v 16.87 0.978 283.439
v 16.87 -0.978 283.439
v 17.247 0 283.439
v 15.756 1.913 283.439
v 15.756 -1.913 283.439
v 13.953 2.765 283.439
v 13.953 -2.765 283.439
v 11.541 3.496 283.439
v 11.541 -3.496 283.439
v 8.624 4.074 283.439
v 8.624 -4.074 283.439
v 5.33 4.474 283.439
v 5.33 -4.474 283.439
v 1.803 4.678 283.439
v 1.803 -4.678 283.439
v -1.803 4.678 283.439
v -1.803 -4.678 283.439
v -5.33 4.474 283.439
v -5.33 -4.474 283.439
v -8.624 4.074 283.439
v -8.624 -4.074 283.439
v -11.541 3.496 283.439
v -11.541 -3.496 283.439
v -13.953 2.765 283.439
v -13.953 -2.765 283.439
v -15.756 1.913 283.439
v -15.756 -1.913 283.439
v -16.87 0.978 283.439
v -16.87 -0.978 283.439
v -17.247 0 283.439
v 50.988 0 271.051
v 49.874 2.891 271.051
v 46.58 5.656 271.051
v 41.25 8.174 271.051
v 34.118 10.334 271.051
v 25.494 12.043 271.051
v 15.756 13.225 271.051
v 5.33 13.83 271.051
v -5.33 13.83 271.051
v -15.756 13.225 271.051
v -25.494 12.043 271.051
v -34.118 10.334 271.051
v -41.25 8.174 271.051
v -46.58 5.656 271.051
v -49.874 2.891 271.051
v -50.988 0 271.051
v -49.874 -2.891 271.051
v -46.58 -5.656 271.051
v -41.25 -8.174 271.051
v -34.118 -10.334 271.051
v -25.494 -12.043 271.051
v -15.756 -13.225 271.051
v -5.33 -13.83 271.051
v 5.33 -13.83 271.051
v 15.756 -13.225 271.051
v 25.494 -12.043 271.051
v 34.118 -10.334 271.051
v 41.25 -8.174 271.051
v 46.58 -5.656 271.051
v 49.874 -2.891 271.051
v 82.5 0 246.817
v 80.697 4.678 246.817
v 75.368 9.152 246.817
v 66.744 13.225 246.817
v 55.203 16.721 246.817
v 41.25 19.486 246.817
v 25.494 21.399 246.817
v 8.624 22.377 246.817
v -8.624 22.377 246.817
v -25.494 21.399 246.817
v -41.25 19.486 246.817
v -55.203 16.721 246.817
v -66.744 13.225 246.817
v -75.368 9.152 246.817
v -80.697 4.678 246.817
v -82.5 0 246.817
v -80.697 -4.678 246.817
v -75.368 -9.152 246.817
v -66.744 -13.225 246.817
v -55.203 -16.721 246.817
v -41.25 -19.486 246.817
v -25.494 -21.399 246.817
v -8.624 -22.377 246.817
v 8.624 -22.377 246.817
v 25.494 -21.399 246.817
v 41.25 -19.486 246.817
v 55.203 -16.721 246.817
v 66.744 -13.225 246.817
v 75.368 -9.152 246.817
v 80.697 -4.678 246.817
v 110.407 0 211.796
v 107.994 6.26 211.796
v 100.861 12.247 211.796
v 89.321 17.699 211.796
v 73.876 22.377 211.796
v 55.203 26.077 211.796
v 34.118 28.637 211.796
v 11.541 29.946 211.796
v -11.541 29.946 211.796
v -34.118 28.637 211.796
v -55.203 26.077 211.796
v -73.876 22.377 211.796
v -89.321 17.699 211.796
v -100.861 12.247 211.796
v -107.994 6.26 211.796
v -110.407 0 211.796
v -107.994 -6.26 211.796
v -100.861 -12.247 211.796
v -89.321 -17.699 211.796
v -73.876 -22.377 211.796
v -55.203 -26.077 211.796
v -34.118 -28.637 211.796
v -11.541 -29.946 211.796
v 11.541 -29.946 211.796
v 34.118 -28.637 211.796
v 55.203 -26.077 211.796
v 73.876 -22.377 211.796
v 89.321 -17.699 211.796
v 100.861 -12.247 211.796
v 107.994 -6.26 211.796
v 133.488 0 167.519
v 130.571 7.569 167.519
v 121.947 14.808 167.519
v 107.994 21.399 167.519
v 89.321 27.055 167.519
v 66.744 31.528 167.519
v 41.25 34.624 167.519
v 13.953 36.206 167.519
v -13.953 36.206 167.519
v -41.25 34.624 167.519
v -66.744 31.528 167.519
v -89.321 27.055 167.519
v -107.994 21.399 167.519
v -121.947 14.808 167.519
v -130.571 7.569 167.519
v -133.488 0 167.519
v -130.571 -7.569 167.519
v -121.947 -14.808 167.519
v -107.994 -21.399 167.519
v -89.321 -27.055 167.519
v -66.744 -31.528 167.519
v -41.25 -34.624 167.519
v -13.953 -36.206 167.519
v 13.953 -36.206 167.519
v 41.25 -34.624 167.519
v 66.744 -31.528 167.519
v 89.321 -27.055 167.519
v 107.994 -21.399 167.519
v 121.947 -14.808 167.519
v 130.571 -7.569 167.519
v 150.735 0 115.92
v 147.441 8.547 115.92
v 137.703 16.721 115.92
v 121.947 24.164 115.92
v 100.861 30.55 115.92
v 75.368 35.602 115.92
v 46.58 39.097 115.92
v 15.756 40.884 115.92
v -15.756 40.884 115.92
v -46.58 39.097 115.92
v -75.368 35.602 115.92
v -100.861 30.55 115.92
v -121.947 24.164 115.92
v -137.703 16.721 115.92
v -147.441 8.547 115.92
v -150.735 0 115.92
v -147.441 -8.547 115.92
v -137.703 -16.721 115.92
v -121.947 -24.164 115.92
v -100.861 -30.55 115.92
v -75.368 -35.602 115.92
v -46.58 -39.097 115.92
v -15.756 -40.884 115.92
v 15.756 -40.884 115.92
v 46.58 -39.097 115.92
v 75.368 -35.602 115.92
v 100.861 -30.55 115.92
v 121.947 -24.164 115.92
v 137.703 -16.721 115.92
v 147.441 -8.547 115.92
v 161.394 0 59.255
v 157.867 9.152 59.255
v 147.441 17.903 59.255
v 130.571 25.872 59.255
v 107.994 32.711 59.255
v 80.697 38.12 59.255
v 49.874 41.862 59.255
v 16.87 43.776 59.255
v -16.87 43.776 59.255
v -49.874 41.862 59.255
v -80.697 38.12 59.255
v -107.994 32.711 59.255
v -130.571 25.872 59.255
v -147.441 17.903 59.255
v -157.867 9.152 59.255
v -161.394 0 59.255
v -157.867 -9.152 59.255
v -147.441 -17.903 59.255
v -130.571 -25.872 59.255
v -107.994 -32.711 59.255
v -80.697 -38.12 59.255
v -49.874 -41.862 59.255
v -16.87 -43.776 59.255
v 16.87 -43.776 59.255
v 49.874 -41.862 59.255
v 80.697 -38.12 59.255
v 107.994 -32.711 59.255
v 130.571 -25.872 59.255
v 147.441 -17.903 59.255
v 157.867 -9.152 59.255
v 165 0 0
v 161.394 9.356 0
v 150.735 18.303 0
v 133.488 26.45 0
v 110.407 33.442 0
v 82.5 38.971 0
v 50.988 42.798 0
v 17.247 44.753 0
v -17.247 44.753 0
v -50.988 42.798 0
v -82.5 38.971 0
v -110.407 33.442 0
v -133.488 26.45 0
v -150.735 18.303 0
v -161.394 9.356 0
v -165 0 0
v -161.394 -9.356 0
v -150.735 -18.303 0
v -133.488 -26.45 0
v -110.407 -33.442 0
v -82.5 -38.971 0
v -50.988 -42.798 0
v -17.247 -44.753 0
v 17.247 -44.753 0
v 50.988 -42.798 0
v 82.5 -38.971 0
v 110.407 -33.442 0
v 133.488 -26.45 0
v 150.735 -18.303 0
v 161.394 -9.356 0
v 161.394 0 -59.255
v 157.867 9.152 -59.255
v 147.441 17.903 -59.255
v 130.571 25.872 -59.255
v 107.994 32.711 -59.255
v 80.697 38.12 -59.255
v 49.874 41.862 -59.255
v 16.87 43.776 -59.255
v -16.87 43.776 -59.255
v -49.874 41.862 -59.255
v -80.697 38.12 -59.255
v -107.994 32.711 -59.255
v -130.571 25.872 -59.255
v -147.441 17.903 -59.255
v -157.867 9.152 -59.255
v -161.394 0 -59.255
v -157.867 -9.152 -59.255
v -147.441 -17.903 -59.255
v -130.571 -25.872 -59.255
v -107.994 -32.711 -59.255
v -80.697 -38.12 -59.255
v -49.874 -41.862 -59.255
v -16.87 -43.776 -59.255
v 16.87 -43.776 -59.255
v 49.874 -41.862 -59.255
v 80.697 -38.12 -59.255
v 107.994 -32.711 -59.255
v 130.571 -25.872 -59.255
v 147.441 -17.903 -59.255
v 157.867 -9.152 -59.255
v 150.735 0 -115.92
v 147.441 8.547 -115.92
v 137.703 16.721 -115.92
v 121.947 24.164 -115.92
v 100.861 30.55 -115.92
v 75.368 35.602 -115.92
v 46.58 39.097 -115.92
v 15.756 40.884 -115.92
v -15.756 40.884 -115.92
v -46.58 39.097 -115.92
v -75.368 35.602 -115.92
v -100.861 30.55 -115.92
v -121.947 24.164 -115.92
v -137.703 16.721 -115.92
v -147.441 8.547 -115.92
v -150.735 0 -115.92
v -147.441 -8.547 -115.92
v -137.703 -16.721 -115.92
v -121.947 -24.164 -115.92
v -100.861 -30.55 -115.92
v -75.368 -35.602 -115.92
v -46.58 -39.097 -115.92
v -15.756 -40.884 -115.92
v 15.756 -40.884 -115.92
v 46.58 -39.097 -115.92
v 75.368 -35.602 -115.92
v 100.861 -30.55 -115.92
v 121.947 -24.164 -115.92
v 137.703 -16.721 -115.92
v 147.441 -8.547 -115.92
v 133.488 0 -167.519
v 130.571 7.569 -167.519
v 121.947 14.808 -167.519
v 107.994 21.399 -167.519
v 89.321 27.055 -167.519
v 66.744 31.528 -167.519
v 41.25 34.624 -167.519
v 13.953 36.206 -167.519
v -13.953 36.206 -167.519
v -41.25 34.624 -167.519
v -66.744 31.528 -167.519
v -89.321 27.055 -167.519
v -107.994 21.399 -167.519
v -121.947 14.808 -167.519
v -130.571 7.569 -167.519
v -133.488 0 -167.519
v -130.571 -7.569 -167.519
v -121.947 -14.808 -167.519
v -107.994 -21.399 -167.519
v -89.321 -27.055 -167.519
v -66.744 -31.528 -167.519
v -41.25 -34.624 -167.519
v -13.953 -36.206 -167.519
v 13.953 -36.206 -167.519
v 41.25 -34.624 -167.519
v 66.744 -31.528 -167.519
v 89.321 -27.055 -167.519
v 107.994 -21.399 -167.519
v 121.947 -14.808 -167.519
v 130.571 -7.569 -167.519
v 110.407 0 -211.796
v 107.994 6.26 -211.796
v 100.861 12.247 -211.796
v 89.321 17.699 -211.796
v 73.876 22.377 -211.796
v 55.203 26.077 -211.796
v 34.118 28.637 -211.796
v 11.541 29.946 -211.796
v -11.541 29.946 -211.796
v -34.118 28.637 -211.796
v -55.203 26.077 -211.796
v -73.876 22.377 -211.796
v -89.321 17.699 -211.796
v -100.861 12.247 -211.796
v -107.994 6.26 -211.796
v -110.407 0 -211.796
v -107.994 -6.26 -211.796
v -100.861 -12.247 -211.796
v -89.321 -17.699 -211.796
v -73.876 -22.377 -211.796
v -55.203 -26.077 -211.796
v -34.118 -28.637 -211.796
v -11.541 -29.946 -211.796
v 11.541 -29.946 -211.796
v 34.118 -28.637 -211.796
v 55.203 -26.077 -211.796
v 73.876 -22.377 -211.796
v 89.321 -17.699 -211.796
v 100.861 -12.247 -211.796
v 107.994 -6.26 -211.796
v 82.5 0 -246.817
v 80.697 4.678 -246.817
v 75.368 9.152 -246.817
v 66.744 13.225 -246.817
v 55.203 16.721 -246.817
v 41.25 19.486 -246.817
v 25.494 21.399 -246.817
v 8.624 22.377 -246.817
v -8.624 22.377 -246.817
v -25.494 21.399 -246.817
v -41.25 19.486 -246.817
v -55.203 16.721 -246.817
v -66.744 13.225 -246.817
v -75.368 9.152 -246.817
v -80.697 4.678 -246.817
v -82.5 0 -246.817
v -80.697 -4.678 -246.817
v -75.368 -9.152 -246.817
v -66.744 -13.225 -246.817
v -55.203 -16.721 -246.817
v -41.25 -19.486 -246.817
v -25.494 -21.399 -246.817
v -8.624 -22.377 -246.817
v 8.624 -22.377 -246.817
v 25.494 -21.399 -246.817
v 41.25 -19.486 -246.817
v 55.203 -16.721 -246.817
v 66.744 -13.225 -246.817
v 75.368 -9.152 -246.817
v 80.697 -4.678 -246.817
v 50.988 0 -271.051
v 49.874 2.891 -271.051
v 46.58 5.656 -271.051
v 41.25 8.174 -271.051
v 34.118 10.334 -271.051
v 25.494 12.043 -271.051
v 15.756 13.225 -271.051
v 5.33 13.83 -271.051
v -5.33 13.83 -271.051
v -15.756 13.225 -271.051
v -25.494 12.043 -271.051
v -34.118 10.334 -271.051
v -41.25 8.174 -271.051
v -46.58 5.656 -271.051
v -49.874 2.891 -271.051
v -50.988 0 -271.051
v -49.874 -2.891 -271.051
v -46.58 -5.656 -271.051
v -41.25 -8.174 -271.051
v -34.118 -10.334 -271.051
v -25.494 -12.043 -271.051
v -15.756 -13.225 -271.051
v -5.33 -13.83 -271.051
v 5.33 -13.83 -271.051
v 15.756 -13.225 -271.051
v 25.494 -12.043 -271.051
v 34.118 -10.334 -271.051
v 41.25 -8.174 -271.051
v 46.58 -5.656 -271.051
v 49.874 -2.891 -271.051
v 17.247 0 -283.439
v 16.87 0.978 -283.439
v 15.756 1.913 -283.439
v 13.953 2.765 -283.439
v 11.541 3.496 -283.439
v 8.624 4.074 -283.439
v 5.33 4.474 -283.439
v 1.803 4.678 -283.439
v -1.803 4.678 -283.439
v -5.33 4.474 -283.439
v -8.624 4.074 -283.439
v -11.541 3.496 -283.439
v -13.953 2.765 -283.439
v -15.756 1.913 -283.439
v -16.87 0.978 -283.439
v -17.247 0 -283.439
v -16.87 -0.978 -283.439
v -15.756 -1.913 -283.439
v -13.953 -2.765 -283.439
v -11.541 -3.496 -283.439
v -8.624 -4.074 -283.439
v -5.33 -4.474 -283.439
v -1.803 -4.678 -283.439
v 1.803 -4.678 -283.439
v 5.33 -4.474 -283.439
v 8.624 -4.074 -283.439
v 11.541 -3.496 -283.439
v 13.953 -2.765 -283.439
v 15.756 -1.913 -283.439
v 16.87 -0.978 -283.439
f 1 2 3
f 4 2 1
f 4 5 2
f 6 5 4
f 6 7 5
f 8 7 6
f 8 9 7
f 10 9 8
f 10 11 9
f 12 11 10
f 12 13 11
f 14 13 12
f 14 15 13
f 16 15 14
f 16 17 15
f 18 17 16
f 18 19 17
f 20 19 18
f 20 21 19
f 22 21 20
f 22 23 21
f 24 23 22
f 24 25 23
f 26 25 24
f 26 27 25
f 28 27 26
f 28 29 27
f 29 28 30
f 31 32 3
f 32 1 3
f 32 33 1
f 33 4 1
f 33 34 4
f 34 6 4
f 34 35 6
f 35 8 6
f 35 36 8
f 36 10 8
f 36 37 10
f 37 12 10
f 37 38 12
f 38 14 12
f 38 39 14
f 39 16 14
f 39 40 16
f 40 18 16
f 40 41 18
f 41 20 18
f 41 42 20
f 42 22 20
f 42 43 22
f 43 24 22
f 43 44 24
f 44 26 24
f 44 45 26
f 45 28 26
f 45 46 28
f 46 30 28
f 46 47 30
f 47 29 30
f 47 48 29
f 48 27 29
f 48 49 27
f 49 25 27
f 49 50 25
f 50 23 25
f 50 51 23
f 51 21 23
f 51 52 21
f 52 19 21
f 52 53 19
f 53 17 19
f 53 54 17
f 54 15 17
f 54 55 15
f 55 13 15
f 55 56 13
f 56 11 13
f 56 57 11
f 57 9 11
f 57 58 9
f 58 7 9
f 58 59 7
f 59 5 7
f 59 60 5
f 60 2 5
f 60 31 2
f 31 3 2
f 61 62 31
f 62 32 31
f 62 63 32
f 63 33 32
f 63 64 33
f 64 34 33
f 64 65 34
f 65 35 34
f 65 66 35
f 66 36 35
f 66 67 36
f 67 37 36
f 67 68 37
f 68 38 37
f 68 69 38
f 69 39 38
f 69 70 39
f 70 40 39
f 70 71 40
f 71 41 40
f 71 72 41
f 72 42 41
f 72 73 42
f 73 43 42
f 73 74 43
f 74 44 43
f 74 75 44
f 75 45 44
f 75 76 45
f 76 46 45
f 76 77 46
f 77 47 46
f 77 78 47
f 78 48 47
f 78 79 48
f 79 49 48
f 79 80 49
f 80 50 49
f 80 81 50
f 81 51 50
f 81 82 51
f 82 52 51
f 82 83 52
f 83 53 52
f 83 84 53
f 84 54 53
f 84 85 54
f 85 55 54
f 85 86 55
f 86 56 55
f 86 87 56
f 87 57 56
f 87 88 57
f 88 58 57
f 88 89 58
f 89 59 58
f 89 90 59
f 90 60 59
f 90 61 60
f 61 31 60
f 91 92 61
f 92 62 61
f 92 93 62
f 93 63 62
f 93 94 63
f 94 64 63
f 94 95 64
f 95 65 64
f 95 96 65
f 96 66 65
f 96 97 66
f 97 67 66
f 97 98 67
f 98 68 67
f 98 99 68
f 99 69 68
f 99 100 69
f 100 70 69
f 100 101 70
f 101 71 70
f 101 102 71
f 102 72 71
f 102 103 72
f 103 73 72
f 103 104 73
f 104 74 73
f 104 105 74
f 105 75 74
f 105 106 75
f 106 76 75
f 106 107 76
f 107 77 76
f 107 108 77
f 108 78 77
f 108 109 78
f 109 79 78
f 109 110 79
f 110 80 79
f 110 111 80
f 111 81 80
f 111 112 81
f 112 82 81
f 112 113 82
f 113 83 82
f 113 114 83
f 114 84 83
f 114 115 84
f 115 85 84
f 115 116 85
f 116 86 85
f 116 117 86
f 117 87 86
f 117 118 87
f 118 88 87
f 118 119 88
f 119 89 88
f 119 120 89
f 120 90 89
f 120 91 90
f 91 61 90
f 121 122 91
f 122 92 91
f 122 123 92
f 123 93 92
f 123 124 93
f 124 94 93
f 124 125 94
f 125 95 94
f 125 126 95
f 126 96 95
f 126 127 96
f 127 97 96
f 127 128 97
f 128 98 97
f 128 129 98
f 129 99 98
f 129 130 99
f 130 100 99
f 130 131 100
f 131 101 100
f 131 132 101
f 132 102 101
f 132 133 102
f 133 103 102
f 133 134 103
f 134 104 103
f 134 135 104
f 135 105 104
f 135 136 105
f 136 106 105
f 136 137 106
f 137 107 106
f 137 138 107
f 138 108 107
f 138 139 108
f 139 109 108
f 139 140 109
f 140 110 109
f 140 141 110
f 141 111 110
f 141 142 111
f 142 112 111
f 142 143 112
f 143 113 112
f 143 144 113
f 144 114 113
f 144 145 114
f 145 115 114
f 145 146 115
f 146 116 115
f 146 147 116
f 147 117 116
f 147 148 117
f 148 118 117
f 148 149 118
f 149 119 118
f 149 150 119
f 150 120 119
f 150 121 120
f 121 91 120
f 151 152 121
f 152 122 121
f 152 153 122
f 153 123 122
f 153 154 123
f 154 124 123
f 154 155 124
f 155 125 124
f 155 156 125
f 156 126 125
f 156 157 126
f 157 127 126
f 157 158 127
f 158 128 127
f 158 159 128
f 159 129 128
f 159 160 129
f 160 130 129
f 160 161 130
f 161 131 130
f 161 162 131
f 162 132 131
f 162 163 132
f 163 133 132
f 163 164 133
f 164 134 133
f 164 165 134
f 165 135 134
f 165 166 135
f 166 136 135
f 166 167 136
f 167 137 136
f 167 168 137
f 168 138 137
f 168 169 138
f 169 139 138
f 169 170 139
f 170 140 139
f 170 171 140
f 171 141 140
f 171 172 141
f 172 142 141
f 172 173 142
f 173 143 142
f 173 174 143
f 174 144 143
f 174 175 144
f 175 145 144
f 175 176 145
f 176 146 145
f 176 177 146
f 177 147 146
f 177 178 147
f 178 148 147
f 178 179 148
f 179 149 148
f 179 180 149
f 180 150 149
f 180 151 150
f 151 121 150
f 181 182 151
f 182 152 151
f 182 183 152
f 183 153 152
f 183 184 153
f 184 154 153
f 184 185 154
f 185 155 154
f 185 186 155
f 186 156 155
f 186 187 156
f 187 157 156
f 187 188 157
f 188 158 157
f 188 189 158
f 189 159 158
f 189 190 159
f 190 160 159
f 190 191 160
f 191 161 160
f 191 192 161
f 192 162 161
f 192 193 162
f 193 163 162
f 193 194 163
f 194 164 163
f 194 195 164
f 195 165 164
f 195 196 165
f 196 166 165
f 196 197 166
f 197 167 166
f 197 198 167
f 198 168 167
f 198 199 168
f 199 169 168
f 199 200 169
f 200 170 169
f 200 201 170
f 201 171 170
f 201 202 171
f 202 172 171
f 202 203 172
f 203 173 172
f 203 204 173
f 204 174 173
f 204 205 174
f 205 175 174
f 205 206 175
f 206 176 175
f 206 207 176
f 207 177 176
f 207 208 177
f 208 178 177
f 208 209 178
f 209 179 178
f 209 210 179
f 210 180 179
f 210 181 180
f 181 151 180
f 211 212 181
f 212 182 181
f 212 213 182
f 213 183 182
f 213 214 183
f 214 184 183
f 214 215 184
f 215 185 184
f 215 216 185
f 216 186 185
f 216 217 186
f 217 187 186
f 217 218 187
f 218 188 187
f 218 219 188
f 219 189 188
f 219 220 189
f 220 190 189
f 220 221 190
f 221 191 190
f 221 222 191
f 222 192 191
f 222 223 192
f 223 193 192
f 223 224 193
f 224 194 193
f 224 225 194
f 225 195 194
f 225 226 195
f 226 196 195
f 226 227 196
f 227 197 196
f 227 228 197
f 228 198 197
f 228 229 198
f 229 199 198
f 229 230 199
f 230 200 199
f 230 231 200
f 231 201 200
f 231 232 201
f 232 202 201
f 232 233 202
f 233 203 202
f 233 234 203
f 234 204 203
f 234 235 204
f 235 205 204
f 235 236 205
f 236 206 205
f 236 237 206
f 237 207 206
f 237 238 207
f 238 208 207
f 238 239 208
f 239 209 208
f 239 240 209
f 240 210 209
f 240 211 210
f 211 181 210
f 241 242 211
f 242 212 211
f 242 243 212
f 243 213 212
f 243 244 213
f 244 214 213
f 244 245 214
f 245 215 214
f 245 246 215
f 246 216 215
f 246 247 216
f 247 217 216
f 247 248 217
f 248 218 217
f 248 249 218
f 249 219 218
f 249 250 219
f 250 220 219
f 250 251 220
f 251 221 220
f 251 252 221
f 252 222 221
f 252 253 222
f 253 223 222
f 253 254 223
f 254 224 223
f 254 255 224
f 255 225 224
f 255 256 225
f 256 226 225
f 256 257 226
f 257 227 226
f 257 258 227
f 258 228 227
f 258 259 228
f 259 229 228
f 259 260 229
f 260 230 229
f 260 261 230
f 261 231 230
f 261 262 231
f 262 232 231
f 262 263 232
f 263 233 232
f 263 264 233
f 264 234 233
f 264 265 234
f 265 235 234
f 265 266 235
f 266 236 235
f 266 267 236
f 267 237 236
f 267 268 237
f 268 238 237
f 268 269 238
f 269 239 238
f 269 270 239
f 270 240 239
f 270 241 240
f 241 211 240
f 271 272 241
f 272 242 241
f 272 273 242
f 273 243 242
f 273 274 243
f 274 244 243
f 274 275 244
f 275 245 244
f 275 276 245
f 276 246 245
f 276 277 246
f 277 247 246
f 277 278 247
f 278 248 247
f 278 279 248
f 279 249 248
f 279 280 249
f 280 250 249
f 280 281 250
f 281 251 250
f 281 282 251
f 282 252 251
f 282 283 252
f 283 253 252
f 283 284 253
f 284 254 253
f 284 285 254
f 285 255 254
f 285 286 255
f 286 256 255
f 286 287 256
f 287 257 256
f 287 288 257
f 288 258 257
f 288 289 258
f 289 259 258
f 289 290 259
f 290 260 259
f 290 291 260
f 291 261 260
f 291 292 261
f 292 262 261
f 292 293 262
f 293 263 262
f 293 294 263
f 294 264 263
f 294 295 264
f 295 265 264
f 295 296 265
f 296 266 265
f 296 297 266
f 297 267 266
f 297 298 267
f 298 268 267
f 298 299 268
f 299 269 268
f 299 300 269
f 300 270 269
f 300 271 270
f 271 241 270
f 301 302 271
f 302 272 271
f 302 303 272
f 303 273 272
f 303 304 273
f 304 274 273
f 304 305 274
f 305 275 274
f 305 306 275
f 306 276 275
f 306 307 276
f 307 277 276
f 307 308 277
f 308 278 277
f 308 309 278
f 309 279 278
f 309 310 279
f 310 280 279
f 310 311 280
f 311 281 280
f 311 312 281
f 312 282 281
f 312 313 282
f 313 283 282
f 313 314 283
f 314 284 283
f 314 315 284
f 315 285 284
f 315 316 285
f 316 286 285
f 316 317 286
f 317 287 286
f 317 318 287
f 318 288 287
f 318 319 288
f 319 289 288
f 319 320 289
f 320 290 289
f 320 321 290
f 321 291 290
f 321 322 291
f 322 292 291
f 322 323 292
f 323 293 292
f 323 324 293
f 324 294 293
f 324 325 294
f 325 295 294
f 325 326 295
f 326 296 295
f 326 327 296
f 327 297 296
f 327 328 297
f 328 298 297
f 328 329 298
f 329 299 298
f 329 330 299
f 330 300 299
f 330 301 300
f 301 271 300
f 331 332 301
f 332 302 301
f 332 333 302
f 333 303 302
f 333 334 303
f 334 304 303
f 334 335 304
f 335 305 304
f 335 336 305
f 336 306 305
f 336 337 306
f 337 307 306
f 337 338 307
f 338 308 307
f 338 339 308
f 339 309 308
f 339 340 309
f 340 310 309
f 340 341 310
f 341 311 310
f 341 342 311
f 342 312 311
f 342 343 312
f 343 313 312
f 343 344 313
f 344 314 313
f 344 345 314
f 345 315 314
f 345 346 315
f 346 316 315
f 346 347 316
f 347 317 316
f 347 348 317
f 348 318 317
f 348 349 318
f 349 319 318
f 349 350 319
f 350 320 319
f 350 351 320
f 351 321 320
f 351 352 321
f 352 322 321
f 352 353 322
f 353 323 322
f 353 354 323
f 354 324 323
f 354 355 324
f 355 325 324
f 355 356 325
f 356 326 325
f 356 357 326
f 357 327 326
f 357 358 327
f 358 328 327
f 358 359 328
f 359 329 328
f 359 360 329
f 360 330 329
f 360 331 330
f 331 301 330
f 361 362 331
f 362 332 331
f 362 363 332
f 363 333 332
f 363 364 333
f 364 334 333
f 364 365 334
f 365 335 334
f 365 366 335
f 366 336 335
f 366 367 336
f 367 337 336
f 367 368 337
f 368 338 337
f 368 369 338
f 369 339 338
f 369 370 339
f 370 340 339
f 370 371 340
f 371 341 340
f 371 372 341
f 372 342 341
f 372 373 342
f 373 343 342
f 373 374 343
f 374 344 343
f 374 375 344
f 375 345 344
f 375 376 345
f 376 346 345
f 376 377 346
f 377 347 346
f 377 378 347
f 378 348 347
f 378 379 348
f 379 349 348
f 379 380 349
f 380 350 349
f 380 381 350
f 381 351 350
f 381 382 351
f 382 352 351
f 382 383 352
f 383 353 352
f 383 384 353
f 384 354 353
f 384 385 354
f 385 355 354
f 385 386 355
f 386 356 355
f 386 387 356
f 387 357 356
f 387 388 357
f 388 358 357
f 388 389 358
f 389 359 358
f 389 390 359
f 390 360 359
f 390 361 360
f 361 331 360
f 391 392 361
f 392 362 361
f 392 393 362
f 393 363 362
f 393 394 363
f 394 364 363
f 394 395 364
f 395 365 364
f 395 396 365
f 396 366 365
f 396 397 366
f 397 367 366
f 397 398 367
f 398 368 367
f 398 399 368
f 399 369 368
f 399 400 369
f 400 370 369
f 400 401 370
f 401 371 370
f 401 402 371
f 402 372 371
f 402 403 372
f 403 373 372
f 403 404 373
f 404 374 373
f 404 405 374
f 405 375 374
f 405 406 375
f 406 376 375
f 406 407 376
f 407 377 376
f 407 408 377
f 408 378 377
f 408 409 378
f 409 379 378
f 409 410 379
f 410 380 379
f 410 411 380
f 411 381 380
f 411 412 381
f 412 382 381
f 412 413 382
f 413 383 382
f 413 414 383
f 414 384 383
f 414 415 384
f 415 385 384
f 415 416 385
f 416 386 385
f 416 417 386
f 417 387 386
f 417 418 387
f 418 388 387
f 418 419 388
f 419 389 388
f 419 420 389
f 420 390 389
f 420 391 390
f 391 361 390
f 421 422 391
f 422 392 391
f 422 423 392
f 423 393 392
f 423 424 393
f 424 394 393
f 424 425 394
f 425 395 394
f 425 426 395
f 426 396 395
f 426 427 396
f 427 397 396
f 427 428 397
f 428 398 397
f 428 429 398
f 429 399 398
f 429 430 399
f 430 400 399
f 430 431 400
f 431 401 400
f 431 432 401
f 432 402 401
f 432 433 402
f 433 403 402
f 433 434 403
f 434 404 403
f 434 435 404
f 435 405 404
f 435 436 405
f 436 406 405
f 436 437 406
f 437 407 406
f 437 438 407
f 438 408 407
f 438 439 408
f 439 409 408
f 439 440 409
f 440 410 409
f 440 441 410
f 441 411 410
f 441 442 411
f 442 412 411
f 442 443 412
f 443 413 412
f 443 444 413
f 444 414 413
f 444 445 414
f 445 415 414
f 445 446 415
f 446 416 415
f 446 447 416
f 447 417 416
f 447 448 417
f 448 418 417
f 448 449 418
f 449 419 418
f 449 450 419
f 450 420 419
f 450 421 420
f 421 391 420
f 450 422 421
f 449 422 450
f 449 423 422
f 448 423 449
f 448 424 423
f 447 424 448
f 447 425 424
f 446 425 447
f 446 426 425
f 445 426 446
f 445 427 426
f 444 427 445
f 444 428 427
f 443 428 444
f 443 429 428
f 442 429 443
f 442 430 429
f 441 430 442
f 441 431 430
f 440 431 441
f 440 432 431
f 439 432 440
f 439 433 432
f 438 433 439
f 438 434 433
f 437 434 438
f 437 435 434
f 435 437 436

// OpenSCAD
// Generated by SolidPython 1.0.1 on 2020-07-29 00:46:49


scale(v = [11, 3, 19]) {
	sphere(r = 15);
}
/***********************************************
*********      SolidPython code:      **********
************************************************
 
# import packages: SolidPython
from solid import *
from solid.utils import *
from itertools import chain, combinations, permutations


class Resize:

    def __init__(self, scad_file):
        self.scad_file = scad_file
        #self.scad_file = import_scad(scad_file)
        # cone/cylinder param:
        self.r1 = 0
        self.r2 = 0
        self.h = 0
        # rectangular prism param:
        self.w = 0
        self.l = 0
        # ellipse param:
        self.r = 0

    # import OpenScad code (file name corresponds to shape)


    # classify shape + parameters
    def assign(self, param1, param2, param3):
        if self.scad_file == 'cone.scad':
            self.r1 = param1
            self.r2 = param2
            self.h = param3
        elif self.scad_file == 'cylinder.scad':
            self.r1 = param1
            self.r2 = param2
            self.h = param3
        elif self.scad_file == 'rectangularPrism.scad':
            self.h = param1
            self.l = param2
            self.w = param3
        else:
            self.r = param1
            self.h = param2

    # resize parameters
    def iterate(self):
        x = range(3, 20, 2)
        i = 1
        if self.scad_file == 'cone.scad':
            tempList = list(permutations(x, 2))
            for temp in tempList:
                param1 = temp[0]
                param2 = temp[1]
                filepath = 'produced_scad_files/' + 'cone' + str(param1) + '_' + str(param2) + '_' + '.scad'
                scad_render_to_file(cylinder(h=param1, r1=param2, r2=0), filepath)

        elif self.scad_file == 'cylinder.scad':
            tempList = list(permutations(x, 3))
            for temp in tempList:
                param1 = temp[0]
                param2 = temp[1]
                filepath = 'produced_scad_files/' + 'cylinder' + str(param1) + '_' + str(param2) + '_' + '.scad'
                scad_render_to_file(cylinder(h=param1, r1=param2, r2=param2), filepath)

        elif self.scad_file == 'rectangularPrism.scad':
            tempList = list(permutations(x, 3))
            for temp in tempList:
                param1 = temp[0]
                param2 = temp[1]
                param3 = temp[2]
                filepath = 'produced_scad_files/' + 'rectangularPrism' + str(param1) + '_' + str(param2) + '_' + str(
                    param3) + '.scad'
                scad_render_to_file(cube(size=(param1, param2, param3)), filepath)

        elif self.scad_file == 'ellipse.scad':
            tempList = list(permutations(x, 4))
            for temp in tempList:
                param1 = temp[0]
                param2 = temp[1]
                param3 = temp[2]
                param4 = temp[3]
                filepath = 'produced_scad_files/' + 'ellipse' + str(param1) + '_' + str(param2) + '_' + str(param3) + '_' + str(param4) + '.scad'
                scad_render_to_file(scale([param1, param2, param3])(sphere(r=param4)), filepath)

    def render_to_scadfile(self):
        scad_render_to_file(scad, 'example.scad') 
 
************************************************/
